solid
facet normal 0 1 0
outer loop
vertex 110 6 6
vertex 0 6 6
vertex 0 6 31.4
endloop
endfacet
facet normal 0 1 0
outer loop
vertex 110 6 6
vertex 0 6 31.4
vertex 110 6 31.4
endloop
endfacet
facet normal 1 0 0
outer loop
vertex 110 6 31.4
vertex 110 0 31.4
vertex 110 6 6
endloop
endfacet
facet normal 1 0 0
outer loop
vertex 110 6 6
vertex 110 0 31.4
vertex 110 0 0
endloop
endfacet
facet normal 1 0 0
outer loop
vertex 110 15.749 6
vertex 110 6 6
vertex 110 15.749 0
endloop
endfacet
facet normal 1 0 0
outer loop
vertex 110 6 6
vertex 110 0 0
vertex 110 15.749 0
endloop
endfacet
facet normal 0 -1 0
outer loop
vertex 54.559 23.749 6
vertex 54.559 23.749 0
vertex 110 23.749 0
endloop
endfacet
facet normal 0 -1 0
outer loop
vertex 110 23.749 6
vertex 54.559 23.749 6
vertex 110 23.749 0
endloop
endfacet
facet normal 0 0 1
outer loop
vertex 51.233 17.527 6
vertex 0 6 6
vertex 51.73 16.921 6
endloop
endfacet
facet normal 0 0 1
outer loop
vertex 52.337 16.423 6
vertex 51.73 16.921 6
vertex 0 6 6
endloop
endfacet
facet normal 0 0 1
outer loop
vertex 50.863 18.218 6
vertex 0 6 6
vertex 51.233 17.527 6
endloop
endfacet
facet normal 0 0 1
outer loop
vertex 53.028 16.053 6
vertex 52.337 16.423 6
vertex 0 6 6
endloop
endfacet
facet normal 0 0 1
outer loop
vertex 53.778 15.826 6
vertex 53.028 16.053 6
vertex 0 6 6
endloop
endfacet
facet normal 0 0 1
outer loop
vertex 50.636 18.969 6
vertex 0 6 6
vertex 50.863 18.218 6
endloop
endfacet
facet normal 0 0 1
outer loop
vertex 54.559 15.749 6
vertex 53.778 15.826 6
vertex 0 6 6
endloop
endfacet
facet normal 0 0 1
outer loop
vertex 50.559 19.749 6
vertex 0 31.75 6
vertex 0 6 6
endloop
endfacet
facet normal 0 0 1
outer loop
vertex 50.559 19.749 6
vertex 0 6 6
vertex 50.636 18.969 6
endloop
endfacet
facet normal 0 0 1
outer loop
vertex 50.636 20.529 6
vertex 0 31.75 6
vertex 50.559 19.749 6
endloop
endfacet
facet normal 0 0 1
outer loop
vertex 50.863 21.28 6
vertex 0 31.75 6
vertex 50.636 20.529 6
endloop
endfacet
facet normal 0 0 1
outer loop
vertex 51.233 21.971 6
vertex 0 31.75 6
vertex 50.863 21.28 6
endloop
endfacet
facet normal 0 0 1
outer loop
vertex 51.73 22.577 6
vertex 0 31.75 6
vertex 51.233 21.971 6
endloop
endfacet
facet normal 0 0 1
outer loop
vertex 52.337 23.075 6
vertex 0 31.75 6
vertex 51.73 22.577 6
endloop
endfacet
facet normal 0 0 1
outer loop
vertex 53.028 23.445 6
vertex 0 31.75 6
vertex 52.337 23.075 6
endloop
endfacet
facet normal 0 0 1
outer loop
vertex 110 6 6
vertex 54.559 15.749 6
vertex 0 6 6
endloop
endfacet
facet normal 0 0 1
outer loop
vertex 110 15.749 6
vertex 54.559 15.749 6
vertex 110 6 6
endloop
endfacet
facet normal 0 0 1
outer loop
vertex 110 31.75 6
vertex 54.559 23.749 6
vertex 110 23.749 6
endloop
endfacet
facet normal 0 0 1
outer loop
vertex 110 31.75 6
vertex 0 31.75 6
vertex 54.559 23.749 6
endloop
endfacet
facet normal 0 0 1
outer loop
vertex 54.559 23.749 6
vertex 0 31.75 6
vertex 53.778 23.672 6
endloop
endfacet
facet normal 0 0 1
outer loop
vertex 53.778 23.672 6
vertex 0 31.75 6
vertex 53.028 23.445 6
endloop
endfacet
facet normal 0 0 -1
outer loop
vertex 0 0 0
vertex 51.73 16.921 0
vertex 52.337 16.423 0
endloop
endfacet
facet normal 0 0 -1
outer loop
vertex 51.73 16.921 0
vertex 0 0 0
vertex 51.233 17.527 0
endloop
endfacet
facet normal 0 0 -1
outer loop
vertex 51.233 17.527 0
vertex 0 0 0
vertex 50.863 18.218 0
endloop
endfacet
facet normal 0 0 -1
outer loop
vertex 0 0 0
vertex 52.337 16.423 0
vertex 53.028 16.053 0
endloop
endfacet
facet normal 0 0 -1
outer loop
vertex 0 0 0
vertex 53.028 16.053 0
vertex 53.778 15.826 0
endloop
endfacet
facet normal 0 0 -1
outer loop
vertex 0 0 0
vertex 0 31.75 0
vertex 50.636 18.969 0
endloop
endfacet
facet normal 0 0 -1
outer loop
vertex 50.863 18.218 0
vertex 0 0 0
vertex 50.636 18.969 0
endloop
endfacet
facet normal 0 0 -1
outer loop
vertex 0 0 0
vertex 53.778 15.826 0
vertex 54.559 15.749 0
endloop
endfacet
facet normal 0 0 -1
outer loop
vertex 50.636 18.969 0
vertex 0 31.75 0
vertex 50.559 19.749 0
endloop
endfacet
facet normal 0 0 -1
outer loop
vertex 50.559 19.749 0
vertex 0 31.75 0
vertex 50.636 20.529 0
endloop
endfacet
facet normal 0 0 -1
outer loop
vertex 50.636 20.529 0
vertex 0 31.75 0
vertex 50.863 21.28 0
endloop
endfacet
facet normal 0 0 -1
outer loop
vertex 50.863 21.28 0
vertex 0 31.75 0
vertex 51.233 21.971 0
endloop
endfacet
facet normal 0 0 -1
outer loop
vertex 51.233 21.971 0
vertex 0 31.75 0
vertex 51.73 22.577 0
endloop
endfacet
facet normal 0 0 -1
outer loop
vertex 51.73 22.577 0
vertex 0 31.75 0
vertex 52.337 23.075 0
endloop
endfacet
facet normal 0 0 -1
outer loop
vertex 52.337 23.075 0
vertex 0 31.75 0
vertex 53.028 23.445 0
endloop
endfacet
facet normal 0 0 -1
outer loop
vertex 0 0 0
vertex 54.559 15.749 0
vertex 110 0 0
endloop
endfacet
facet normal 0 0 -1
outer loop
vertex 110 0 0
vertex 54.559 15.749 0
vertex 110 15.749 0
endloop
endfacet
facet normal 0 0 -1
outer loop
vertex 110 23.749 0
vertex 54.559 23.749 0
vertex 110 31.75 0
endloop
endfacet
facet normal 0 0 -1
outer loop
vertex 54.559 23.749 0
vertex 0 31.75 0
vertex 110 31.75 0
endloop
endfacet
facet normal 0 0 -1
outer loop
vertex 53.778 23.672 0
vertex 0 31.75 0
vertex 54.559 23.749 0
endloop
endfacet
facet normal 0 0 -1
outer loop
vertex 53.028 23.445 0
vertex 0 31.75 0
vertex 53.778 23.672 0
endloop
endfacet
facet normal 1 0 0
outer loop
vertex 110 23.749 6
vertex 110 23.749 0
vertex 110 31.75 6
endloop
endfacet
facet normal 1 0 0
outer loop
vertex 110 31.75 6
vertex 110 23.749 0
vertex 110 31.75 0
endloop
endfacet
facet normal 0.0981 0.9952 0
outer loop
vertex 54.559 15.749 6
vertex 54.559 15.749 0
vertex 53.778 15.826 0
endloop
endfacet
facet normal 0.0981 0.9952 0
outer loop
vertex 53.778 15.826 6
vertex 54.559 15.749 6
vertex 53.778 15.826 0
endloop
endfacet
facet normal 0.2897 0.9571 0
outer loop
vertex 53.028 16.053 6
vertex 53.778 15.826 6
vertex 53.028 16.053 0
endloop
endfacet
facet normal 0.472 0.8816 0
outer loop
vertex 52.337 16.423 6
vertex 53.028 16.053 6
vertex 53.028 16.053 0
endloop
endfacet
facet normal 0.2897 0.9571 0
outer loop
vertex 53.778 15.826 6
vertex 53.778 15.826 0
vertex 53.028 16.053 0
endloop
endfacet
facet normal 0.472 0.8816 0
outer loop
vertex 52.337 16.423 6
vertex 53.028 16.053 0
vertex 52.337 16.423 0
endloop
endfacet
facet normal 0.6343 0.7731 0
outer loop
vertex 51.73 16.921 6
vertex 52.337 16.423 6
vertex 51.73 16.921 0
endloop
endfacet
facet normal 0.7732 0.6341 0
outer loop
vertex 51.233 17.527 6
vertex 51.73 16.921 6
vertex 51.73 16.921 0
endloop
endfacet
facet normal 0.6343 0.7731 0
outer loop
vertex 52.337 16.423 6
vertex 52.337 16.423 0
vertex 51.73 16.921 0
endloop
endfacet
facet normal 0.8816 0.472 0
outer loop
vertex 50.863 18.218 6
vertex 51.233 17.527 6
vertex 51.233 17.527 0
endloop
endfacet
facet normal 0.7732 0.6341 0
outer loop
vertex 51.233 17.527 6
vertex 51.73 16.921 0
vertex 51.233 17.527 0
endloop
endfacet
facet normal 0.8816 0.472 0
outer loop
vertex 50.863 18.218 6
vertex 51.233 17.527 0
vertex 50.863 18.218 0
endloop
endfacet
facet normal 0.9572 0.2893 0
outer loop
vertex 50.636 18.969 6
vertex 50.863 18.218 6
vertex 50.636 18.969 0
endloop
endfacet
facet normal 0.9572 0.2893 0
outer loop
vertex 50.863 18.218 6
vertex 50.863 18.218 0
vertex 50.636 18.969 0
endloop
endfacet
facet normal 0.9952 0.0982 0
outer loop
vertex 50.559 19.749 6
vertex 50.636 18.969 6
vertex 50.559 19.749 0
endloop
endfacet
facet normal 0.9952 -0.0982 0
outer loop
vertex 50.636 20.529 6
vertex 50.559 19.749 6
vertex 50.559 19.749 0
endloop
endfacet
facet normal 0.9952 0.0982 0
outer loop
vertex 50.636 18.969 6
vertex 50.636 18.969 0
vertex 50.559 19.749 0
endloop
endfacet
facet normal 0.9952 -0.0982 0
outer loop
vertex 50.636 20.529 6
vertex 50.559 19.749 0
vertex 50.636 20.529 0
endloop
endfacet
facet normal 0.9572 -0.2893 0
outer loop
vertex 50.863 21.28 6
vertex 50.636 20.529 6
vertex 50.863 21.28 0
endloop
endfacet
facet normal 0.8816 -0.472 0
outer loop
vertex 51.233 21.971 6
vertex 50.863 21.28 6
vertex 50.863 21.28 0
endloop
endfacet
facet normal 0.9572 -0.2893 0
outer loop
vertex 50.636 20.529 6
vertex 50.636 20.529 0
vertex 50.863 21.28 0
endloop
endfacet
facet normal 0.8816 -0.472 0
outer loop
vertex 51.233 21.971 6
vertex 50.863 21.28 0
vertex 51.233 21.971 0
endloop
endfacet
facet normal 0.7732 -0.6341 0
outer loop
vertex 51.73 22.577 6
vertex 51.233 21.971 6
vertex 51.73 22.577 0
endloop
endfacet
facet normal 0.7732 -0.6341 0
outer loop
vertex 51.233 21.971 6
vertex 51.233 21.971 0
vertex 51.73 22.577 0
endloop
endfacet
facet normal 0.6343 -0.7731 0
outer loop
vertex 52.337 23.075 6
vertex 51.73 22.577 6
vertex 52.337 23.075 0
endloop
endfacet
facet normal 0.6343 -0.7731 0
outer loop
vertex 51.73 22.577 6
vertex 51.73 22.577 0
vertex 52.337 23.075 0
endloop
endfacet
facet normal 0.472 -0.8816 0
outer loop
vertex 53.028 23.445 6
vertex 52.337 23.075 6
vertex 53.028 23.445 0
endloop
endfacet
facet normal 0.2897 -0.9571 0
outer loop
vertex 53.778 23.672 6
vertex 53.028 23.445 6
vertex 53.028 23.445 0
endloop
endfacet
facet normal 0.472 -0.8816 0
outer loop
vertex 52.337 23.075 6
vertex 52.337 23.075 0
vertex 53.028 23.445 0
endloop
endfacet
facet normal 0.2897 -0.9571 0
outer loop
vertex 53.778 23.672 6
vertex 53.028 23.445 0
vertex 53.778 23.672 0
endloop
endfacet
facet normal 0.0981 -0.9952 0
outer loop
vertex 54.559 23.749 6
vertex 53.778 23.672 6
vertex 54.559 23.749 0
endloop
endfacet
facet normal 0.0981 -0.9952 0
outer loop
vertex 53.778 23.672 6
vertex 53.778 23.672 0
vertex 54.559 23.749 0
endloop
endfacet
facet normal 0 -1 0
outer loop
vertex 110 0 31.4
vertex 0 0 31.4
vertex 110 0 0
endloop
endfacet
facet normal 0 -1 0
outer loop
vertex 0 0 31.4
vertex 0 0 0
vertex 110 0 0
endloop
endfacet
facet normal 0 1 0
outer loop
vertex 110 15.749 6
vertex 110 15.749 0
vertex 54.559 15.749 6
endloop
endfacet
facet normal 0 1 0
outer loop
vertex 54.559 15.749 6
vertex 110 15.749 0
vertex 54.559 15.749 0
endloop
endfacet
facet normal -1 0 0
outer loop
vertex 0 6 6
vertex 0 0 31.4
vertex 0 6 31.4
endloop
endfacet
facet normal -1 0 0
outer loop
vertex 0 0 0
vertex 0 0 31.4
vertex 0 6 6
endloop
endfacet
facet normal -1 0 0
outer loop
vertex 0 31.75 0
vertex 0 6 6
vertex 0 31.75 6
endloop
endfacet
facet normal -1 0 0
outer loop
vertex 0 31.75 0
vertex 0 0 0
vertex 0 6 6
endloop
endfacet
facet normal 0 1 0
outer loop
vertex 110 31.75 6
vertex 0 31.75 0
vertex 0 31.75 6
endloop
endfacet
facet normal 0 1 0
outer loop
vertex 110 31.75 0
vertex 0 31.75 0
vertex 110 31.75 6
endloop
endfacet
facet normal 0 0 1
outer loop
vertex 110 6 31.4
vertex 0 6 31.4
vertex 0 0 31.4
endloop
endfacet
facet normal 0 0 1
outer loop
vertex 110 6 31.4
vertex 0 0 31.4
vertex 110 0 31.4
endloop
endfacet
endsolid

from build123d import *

# Parameters (mm, degrees)
F0_W     = 110
F0_H     = 31.75
F1_DEPTH = 6
F2_W     = 110
F2_H     = 6
F3_DEPTH = 25.4
F5_DEPTH = 31.401


with BuildPart() as f1:
    # F0 (on Top) → F1 (new body)
    with BuildSketch(Plane.XY):
        with Locations((55, 15.875)):
            Rectangle(F0_W, F0_H)
    extrude(amount=F1_DEPTH)

    # F2 (on face) → F3 (join)
    with BuildSketch(Plane.XY.offset(6)):
        with Locations((55, 3)):
            Rectangle(F2_W, F2_H)
    extrude(amount=F3_DEPTH)

    # F4 (on face) → F5 (cut, through all)
    with BuildSketch(Plane(origin=(0, 0, 0), x_dir=(1, 0, 0), z_dir=(0, 0, -1))):
        with BuildLine():
            ThreePointArc((54.5588247478, -23.749), (57.3872518725, -22.5774271247), (58.5588247478, -19.749))
            ThreePointArc((58.5588247478, -19.749), (57.3872518725, -16.9205728753), (54.5588247478, -15.749))
            Line((54.5588247478, -15.749), (54.5588247478, -19.749))
            Line((54.5588247478, -19.749), (54.5588247478, -23.749))
        make_face()
        with BuildLine():
            ThreePointArc((54.5588247478, -15.749), (57.3872518725, -16.9205728753), (58.5588247478, -19.749))
            ThreePointArc((58.5588247478, -19.749), (57.3872518725, -22.5774271247), (54.5588247478, -23.749))
            Line((54.5588247478, -23.749), (110, -23.749))
            Line((110, -23.749), (110, -15.749))
            Line((110, -15.749), (54.5588247478, -15.749))
        make_face()
        with BuildLine():
            Line((54.5588247478, -19.749), (54.5588247478, -15.749))
            ThreePointArc((54.5588247478, -15.749), (50.5588247478, -19.749), (54.5588247478, -23.749))
            Line((54.5588247478, -23.749), (54.5588247478, -19.749))
        make_face()
    extrude(amount=-F5_DEPTH, mode=Mode.SUBTRACT)


solid = f1.part
